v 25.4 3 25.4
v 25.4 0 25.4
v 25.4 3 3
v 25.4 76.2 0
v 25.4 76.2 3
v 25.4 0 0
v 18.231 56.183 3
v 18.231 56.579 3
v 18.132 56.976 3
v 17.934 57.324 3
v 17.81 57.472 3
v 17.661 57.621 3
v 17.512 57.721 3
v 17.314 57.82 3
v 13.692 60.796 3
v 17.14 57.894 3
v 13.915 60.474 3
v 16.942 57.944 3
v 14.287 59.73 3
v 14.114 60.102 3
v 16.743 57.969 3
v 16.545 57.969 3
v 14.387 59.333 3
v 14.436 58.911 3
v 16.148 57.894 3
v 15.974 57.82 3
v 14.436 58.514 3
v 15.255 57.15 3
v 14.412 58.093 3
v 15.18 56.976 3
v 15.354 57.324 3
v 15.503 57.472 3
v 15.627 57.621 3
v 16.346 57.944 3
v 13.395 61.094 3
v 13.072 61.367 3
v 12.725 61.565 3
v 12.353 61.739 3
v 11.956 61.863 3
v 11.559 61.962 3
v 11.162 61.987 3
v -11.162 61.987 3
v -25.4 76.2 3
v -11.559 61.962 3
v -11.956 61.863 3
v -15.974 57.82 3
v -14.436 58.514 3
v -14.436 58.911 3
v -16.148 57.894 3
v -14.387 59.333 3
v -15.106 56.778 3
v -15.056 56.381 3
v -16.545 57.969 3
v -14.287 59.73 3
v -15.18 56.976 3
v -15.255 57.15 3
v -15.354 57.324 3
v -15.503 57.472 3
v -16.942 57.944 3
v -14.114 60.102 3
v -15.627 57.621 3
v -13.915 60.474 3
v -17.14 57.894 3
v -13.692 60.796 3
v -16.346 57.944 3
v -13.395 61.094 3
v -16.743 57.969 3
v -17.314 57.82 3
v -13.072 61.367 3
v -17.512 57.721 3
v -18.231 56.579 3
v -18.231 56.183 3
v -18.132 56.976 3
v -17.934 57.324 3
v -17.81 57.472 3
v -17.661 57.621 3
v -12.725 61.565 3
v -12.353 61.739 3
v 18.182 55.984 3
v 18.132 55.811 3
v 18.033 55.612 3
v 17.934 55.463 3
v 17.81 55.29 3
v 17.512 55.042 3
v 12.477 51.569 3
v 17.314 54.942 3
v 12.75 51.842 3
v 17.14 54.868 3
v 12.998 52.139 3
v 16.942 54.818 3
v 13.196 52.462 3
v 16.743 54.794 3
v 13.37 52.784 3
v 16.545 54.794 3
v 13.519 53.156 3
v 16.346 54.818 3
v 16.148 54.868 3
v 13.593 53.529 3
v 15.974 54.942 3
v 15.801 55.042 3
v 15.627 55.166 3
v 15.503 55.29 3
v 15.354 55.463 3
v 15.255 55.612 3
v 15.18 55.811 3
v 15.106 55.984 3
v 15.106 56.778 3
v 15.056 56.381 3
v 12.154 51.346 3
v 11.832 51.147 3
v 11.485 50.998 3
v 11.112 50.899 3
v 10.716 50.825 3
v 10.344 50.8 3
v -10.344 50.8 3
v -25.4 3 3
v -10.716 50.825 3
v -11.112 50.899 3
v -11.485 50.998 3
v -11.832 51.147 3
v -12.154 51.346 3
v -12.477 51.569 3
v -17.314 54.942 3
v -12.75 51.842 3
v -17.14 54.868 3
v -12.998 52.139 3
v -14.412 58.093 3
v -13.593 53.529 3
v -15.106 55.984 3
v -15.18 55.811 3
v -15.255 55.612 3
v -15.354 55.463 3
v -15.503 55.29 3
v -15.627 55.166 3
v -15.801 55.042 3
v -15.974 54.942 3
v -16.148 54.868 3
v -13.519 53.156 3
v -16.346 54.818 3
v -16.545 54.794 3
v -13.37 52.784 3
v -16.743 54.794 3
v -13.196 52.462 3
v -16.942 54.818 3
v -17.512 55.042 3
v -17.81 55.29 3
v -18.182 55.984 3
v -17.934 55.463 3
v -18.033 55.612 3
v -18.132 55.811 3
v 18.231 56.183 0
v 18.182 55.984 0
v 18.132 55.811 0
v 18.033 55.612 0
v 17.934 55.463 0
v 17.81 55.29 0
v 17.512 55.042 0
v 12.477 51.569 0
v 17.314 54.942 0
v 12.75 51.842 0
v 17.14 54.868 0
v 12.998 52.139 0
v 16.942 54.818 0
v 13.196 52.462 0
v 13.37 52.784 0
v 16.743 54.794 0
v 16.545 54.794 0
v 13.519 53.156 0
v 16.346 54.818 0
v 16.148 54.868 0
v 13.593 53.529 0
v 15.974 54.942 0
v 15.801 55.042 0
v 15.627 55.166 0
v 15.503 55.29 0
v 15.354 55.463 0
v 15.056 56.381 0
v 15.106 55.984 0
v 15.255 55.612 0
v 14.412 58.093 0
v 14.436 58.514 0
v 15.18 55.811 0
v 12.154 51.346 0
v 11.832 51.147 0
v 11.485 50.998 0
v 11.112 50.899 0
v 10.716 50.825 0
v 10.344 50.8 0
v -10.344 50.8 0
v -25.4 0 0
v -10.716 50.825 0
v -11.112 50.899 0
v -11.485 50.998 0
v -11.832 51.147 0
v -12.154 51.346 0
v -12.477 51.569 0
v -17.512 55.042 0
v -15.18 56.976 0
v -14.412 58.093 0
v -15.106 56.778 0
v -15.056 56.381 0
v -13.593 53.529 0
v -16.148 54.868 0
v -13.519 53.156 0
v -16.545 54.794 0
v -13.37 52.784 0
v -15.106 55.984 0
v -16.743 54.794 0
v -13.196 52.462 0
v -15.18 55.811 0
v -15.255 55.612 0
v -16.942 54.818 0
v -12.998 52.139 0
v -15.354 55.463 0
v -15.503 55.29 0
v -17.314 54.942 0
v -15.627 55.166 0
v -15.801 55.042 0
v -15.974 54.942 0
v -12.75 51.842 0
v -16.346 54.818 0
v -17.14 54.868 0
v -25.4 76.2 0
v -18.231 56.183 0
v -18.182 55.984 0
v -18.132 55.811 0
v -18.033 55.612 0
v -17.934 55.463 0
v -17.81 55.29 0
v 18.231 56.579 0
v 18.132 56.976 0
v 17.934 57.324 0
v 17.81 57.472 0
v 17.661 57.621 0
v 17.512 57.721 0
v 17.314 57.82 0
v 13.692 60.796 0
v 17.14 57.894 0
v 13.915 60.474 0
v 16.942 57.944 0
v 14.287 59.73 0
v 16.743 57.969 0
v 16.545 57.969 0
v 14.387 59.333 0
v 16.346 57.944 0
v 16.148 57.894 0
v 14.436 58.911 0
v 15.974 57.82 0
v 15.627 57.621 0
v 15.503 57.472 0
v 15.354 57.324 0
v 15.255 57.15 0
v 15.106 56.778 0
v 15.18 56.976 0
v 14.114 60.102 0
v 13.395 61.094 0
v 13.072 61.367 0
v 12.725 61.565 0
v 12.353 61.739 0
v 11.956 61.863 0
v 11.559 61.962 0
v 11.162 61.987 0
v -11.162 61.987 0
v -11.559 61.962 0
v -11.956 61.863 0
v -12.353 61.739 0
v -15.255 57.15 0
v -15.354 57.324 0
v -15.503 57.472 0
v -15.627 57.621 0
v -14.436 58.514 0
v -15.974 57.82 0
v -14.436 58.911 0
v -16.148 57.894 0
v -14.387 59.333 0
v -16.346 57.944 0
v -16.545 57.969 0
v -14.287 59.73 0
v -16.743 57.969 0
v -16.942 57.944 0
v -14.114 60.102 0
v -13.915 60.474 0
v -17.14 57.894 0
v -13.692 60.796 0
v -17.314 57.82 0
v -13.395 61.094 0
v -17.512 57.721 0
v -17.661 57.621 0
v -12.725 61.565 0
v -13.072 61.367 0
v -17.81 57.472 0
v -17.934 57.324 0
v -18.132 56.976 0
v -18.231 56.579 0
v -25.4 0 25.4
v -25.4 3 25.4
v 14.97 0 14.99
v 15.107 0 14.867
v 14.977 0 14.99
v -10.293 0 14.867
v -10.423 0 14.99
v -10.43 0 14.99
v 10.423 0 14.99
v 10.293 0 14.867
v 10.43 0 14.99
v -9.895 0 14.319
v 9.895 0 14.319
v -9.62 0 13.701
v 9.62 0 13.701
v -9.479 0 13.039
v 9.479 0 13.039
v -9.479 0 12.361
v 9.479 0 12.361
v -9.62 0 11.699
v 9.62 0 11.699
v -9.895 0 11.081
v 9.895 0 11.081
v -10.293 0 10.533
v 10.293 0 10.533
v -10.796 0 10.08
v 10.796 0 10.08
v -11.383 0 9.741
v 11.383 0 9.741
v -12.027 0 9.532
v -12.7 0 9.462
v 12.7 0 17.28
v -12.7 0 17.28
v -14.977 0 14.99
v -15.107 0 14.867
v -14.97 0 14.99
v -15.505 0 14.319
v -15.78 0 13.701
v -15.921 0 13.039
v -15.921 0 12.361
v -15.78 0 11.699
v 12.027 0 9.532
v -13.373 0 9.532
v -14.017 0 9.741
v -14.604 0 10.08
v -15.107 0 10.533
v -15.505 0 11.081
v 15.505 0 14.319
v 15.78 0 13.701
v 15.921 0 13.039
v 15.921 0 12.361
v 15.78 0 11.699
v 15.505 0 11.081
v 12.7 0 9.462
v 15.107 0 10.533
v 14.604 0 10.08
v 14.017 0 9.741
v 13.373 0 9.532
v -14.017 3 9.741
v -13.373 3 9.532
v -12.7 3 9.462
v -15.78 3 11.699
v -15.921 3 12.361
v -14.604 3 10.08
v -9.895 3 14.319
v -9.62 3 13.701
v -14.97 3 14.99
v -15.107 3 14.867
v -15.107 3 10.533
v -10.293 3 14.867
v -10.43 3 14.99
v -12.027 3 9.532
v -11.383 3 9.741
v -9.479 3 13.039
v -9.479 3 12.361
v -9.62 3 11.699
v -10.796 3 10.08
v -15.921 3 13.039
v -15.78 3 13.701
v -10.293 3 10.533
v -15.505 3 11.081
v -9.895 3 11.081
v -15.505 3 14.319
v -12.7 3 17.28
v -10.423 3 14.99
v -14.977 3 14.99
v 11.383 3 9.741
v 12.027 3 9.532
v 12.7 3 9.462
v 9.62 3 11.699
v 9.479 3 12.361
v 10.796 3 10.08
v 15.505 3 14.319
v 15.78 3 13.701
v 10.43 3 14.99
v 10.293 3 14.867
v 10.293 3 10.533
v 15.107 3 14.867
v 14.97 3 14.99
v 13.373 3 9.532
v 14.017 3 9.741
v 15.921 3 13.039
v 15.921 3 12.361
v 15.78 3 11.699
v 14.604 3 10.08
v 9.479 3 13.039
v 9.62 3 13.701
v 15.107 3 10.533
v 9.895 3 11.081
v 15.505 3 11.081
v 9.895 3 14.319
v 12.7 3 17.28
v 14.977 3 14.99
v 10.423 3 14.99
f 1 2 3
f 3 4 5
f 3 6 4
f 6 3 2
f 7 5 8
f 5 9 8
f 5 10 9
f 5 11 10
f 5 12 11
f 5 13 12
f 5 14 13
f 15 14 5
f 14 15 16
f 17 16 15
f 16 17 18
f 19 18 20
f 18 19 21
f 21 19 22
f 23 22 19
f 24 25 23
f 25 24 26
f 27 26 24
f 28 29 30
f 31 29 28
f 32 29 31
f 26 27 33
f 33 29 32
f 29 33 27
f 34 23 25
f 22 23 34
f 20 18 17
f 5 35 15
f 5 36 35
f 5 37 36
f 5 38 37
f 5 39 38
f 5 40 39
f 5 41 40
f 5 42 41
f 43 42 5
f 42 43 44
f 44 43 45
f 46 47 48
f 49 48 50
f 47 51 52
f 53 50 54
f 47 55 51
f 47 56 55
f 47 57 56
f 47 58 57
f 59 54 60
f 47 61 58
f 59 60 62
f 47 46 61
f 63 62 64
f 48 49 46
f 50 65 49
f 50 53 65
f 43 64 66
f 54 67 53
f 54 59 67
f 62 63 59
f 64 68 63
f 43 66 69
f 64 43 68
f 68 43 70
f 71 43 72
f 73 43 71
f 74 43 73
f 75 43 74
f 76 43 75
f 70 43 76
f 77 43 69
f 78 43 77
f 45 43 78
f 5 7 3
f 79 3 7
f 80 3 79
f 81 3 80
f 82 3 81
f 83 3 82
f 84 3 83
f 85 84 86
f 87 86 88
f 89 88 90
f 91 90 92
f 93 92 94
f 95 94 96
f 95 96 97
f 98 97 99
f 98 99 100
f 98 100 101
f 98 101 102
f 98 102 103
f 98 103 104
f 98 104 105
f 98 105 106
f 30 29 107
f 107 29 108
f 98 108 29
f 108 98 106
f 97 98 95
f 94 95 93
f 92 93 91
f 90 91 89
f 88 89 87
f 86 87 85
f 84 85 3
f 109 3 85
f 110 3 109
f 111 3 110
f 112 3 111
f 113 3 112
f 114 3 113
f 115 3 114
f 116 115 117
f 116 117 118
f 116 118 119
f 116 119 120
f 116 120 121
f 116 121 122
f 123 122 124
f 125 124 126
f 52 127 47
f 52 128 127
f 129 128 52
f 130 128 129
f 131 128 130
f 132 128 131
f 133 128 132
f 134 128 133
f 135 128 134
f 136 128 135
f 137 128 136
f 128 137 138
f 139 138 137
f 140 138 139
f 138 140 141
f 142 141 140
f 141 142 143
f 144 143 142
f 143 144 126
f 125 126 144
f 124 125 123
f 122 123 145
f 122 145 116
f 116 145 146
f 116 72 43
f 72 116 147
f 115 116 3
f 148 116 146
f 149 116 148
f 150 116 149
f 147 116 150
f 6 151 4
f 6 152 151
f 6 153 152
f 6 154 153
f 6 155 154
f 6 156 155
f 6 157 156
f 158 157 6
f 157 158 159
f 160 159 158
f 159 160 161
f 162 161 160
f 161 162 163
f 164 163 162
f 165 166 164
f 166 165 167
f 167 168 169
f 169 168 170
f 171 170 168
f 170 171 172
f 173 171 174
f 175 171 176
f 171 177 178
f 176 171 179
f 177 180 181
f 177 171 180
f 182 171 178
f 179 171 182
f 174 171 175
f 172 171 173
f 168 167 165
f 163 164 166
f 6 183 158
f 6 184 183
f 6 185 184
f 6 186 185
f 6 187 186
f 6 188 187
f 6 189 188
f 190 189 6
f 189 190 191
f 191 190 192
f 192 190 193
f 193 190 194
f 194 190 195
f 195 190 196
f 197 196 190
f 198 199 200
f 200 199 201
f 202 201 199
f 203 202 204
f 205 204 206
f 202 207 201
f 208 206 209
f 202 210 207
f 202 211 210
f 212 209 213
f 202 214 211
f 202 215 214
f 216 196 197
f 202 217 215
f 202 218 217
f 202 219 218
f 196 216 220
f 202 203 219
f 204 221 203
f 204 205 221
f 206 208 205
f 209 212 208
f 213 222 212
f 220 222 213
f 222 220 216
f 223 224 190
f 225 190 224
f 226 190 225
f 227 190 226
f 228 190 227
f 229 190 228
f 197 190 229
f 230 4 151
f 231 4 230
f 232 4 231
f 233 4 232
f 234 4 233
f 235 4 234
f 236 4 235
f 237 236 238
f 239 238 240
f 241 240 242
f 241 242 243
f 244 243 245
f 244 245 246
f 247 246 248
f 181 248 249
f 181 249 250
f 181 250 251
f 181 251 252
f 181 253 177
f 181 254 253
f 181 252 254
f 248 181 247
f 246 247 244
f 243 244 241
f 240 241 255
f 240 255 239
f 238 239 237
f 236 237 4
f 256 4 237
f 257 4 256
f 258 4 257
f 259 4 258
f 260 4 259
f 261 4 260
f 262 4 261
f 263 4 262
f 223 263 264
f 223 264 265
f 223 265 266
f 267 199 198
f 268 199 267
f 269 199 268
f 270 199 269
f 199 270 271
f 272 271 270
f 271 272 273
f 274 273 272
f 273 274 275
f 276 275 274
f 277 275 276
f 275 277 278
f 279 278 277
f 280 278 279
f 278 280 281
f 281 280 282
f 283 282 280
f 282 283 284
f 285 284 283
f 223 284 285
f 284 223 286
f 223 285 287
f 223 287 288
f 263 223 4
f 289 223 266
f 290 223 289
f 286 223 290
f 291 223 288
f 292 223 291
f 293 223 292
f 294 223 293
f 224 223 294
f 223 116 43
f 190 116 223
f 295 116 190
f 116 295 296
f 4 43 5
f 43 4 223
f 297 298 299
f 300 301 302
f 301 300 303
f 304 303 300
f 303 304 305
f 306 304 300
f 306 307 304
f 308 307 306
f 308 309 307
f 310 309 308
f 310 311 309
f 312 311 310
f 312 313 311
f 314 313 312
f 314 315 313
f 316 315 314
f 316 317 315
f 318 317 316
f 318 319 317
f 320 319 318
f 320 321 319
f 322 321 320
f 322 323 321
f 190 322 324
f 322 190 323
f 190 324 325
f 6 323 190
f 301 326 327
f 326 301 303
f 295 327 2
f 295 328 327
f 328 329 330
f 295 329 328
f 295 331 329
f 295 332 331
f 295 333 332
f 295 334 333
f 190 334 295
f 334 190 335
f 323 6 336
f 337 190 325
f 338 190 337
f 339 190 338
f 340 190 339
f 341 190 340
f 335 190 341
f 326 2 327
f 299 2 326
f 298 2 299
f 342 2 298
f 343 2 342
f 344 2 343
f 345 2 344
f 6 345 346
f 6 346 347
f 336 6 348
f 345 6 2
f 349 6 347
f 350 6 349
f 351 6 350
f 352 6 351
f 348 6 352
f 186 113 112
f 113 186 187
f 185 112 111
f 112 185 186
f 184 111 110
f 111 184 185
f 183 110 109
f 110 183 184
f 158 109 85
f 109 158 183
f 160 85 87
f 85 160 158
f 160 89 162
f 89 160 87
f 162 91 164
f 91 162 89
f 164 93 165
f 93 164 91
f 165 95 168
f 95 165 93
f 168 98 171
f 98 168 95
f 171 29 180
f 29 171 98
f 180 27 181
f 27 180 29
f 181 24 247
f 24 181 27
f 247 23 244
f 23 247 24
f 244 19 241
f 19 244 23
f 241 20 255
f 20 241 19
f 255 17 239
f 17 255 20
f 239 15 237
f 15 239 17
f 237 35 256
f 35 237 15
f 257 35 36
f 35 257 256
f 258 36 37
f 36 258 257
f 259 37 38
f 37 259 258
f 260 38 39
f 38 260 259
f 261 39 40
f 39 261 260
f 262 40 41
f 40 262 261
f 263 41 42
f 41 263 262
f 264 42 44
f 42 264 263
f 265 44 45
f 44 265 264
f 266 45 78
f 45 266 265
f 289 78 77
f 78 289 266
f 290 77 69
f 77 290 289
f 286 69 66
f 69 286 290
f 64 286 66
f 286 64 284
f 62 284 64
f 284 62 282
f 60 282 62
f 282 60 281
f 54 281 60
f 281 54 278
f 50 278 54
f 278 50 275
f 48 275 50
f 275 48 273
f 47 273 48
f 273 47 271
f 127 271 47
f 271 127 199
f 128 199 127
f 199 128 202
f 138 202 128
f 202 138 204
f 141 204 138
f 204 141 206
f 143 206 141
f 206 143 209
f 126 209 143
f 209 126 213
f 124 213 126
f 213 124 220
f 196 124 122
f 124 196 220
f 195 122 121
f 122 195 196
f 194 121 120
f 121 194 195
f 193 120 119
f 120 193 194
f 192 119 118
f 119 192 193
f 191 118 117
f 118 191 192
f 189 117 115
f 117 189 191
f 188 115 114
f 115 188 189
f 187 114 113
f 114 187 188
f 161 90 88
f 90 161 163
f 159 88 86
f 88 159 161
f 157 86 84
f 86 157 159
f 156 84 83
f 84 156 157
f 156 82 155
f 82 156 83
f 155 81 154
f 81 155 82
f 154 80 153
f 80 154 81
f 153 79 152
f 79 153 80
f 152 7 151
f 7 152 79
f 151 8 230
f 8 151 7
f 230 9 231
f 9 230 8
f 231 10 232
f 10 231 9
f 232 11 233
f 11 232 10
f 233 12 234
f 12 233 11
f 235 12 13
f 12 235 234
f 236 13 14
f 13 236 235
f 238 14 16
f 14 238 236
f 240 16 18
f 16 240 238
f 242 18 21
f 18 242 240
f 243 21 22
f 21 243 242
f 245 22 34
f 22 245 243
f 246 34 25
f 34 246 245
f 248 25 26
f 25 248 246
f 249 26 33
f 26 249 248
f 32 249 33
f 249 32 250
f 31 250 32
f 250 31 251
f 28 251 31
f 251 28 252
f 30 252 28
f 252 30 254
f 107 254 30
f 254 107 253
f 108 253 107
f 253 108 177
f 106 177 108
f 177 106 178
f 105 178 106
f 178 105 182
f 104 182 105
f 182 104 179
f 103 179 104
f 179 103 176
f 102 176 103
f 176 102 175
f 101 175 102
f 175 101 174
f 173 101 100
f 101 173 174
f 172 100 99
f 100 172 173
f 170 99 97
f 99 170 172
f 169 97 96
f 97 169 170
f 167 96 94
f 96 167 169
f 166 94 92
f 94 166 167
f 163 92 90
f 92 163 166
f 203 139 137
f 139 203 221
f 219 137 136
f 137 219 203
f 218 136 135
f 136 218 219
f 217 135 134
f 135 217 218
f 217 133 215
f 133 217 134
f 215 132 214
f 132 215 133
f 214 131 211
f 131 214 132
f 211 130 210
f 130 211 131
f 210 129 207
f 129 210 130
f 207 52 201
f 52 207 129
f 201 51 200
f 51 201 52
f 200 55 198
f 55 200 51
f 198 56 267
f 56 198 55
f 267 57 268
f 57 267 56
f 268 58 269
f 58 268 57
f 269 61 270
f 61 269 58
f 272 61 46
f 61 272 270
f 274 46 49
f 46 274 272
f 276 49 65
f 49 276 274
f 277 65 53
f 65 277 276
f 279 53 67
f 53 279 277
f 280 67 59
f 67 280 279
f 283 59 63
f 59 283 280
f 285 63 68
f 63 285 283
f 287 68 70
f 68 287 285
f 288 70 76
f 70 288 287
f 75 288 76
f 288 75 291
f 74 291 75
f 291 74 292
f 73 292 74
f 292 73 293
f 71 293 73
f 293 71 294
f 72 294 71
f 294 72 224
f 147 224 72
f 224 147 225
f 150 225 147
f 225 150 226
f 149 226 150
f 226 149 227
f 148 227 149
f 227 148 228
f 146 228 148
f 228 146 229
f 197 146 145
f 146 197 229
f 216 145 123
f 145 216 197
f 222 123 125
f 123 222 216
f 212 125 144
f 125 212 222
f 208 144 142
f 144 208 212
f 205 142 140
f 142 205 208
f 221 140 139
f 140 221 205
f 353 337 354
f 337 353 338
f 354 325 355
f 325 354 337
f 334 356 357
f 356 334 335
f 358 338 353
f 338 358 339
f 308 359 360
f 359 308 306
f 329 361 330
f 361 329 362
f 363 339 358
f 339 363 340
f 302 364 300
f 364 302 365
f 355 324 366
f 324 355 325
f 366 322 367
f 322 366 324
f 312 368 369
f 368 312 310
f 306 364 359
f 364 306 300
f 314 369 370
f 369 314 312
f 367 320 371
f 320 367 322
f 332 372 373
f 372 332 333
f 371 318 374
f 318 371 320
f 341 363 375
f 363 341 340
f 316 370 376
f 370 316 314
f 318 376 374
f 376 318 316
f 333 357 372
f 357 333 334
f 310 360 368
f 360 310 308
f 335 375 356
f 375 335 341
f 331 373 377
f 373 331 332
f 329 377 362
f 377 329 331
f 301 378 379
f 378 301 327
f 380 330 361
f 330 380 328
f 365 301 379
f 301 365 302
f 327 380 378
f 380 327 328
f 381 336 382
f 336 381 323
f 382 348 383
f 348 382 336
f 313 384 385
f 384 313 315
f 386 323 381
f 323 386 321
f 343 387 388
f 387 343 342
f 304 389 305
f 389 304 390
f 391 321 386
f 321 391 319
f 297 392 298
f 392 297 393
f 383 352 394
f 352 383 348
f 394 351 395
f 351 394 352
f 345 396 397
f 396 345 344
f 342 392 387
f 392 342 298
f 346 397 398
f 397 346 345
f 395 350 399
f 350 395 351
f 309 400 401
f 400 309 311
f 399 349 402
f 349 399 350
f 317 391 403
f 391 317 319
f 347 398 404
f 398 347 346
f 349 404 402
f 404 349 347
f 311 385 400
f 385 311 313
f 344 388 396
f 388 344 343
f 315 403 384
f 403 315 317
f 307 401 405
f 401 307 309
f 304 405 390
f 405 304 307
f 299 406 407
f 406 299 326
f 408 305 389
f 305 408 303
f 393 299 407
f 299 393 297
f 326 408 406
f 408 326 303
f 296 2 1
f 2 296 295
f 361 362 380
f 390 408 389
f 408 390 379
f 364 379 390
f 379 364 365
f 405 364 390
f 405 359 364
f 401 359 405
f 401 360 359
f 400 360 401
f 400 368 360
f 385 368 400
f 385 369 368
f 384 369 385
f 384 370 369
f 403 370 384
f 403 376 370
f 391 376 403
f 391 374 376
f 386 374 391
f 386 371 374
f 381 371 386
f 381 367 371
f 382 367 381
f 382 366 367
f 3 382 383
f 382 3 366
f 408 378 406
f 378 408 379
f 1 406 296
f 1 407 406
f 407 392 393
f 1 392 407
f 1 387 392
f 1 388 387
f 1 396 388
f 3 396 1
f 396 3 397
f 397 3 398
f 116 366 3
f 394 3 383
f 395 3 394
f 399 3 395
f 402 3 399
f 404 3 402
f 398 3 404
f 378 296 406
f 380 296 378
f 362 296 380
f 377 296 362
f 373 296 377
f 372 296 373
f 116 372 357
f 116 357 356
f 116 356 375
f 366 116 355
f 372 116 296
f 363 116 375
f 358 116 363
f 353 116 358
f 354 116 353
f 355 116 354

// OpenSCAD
use <MCAD/teardrop.scad>

$fn=50;
inch = 25.4;

difference() {
  
  translate([-1*inch, 0, 0])
  cube([2*inch, 3*inch, 3]);
    
union(){
  translate([0, 2*inch, 0])
    linear_extrude(5)
      scale([inch, inch, 0])
        import("./DB15.dxf");
}

}

module myhole() {
  rotate([0, 0, 90]) {
    teardrop(radius=0.255*inch/2, length=20, angle=90);
  }
}

difference() {

translate([-1*inch, 0, 0]) 
cube([2*inch, 3, 1*inch]);

union() {
   
translate([-0.5*inch, 0, 0.5*inch])
myhole();

translate([0.5*inch, 0, 0.5*inch])
myhole();

}
}
